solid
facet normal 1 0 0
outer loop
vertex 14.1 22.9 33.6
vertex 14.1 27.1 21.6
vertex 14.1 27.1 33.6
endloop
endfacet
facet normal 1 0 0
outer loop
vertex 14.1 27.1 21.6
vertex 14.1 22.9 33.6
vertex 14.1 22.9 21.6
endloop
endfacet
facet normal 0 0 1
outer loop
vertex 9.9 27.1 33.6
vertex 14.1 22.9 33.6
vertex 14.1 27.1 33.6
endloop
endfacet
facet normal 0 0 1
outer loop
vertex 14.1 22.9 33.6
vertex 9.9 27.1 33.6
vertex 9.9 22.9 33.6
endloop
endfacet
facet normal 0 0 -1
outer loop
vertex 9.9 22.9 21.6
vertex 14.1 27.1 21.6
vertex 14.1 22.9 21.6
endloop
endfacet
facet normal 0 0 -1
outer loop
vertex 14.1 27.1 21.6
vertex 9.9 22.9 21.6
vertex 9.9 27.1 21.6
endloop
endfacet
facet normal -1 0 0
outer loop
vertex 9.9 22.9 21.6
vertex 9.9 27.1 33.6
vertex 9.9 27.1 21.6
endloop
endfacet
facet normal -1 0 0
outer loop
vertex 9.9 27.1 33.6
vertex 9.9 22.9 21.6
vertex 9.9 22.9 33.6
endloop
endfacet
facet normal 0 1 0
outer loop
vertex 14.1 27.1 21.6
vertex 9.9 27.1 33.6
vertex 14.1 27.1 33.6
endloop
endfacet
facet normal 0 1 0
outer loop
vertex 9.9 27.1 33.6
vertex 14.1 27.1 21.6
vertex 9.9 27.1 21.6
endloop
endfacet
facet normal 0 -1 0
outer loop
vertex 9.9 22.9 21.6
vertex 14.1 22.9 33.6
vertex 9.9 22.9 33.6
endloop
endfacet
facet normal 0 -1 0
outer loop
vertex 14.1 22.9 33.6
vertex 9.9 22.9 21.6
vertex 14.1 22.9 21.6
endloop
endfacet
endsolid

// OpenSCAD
// Generated by spec/prepare_parent_retrofit_printing.py from validated release fasteners. NOT A PRINTABLE PART.
union(){
translate([9.9, 22.9, 21.599999237060548]) cube([4.2, 4.2, 12.00000228881836]);
translate([9.9, 22.9, 21.599999237060548]) cube([4.2, 4.2, 12.00000228881836]);
}
